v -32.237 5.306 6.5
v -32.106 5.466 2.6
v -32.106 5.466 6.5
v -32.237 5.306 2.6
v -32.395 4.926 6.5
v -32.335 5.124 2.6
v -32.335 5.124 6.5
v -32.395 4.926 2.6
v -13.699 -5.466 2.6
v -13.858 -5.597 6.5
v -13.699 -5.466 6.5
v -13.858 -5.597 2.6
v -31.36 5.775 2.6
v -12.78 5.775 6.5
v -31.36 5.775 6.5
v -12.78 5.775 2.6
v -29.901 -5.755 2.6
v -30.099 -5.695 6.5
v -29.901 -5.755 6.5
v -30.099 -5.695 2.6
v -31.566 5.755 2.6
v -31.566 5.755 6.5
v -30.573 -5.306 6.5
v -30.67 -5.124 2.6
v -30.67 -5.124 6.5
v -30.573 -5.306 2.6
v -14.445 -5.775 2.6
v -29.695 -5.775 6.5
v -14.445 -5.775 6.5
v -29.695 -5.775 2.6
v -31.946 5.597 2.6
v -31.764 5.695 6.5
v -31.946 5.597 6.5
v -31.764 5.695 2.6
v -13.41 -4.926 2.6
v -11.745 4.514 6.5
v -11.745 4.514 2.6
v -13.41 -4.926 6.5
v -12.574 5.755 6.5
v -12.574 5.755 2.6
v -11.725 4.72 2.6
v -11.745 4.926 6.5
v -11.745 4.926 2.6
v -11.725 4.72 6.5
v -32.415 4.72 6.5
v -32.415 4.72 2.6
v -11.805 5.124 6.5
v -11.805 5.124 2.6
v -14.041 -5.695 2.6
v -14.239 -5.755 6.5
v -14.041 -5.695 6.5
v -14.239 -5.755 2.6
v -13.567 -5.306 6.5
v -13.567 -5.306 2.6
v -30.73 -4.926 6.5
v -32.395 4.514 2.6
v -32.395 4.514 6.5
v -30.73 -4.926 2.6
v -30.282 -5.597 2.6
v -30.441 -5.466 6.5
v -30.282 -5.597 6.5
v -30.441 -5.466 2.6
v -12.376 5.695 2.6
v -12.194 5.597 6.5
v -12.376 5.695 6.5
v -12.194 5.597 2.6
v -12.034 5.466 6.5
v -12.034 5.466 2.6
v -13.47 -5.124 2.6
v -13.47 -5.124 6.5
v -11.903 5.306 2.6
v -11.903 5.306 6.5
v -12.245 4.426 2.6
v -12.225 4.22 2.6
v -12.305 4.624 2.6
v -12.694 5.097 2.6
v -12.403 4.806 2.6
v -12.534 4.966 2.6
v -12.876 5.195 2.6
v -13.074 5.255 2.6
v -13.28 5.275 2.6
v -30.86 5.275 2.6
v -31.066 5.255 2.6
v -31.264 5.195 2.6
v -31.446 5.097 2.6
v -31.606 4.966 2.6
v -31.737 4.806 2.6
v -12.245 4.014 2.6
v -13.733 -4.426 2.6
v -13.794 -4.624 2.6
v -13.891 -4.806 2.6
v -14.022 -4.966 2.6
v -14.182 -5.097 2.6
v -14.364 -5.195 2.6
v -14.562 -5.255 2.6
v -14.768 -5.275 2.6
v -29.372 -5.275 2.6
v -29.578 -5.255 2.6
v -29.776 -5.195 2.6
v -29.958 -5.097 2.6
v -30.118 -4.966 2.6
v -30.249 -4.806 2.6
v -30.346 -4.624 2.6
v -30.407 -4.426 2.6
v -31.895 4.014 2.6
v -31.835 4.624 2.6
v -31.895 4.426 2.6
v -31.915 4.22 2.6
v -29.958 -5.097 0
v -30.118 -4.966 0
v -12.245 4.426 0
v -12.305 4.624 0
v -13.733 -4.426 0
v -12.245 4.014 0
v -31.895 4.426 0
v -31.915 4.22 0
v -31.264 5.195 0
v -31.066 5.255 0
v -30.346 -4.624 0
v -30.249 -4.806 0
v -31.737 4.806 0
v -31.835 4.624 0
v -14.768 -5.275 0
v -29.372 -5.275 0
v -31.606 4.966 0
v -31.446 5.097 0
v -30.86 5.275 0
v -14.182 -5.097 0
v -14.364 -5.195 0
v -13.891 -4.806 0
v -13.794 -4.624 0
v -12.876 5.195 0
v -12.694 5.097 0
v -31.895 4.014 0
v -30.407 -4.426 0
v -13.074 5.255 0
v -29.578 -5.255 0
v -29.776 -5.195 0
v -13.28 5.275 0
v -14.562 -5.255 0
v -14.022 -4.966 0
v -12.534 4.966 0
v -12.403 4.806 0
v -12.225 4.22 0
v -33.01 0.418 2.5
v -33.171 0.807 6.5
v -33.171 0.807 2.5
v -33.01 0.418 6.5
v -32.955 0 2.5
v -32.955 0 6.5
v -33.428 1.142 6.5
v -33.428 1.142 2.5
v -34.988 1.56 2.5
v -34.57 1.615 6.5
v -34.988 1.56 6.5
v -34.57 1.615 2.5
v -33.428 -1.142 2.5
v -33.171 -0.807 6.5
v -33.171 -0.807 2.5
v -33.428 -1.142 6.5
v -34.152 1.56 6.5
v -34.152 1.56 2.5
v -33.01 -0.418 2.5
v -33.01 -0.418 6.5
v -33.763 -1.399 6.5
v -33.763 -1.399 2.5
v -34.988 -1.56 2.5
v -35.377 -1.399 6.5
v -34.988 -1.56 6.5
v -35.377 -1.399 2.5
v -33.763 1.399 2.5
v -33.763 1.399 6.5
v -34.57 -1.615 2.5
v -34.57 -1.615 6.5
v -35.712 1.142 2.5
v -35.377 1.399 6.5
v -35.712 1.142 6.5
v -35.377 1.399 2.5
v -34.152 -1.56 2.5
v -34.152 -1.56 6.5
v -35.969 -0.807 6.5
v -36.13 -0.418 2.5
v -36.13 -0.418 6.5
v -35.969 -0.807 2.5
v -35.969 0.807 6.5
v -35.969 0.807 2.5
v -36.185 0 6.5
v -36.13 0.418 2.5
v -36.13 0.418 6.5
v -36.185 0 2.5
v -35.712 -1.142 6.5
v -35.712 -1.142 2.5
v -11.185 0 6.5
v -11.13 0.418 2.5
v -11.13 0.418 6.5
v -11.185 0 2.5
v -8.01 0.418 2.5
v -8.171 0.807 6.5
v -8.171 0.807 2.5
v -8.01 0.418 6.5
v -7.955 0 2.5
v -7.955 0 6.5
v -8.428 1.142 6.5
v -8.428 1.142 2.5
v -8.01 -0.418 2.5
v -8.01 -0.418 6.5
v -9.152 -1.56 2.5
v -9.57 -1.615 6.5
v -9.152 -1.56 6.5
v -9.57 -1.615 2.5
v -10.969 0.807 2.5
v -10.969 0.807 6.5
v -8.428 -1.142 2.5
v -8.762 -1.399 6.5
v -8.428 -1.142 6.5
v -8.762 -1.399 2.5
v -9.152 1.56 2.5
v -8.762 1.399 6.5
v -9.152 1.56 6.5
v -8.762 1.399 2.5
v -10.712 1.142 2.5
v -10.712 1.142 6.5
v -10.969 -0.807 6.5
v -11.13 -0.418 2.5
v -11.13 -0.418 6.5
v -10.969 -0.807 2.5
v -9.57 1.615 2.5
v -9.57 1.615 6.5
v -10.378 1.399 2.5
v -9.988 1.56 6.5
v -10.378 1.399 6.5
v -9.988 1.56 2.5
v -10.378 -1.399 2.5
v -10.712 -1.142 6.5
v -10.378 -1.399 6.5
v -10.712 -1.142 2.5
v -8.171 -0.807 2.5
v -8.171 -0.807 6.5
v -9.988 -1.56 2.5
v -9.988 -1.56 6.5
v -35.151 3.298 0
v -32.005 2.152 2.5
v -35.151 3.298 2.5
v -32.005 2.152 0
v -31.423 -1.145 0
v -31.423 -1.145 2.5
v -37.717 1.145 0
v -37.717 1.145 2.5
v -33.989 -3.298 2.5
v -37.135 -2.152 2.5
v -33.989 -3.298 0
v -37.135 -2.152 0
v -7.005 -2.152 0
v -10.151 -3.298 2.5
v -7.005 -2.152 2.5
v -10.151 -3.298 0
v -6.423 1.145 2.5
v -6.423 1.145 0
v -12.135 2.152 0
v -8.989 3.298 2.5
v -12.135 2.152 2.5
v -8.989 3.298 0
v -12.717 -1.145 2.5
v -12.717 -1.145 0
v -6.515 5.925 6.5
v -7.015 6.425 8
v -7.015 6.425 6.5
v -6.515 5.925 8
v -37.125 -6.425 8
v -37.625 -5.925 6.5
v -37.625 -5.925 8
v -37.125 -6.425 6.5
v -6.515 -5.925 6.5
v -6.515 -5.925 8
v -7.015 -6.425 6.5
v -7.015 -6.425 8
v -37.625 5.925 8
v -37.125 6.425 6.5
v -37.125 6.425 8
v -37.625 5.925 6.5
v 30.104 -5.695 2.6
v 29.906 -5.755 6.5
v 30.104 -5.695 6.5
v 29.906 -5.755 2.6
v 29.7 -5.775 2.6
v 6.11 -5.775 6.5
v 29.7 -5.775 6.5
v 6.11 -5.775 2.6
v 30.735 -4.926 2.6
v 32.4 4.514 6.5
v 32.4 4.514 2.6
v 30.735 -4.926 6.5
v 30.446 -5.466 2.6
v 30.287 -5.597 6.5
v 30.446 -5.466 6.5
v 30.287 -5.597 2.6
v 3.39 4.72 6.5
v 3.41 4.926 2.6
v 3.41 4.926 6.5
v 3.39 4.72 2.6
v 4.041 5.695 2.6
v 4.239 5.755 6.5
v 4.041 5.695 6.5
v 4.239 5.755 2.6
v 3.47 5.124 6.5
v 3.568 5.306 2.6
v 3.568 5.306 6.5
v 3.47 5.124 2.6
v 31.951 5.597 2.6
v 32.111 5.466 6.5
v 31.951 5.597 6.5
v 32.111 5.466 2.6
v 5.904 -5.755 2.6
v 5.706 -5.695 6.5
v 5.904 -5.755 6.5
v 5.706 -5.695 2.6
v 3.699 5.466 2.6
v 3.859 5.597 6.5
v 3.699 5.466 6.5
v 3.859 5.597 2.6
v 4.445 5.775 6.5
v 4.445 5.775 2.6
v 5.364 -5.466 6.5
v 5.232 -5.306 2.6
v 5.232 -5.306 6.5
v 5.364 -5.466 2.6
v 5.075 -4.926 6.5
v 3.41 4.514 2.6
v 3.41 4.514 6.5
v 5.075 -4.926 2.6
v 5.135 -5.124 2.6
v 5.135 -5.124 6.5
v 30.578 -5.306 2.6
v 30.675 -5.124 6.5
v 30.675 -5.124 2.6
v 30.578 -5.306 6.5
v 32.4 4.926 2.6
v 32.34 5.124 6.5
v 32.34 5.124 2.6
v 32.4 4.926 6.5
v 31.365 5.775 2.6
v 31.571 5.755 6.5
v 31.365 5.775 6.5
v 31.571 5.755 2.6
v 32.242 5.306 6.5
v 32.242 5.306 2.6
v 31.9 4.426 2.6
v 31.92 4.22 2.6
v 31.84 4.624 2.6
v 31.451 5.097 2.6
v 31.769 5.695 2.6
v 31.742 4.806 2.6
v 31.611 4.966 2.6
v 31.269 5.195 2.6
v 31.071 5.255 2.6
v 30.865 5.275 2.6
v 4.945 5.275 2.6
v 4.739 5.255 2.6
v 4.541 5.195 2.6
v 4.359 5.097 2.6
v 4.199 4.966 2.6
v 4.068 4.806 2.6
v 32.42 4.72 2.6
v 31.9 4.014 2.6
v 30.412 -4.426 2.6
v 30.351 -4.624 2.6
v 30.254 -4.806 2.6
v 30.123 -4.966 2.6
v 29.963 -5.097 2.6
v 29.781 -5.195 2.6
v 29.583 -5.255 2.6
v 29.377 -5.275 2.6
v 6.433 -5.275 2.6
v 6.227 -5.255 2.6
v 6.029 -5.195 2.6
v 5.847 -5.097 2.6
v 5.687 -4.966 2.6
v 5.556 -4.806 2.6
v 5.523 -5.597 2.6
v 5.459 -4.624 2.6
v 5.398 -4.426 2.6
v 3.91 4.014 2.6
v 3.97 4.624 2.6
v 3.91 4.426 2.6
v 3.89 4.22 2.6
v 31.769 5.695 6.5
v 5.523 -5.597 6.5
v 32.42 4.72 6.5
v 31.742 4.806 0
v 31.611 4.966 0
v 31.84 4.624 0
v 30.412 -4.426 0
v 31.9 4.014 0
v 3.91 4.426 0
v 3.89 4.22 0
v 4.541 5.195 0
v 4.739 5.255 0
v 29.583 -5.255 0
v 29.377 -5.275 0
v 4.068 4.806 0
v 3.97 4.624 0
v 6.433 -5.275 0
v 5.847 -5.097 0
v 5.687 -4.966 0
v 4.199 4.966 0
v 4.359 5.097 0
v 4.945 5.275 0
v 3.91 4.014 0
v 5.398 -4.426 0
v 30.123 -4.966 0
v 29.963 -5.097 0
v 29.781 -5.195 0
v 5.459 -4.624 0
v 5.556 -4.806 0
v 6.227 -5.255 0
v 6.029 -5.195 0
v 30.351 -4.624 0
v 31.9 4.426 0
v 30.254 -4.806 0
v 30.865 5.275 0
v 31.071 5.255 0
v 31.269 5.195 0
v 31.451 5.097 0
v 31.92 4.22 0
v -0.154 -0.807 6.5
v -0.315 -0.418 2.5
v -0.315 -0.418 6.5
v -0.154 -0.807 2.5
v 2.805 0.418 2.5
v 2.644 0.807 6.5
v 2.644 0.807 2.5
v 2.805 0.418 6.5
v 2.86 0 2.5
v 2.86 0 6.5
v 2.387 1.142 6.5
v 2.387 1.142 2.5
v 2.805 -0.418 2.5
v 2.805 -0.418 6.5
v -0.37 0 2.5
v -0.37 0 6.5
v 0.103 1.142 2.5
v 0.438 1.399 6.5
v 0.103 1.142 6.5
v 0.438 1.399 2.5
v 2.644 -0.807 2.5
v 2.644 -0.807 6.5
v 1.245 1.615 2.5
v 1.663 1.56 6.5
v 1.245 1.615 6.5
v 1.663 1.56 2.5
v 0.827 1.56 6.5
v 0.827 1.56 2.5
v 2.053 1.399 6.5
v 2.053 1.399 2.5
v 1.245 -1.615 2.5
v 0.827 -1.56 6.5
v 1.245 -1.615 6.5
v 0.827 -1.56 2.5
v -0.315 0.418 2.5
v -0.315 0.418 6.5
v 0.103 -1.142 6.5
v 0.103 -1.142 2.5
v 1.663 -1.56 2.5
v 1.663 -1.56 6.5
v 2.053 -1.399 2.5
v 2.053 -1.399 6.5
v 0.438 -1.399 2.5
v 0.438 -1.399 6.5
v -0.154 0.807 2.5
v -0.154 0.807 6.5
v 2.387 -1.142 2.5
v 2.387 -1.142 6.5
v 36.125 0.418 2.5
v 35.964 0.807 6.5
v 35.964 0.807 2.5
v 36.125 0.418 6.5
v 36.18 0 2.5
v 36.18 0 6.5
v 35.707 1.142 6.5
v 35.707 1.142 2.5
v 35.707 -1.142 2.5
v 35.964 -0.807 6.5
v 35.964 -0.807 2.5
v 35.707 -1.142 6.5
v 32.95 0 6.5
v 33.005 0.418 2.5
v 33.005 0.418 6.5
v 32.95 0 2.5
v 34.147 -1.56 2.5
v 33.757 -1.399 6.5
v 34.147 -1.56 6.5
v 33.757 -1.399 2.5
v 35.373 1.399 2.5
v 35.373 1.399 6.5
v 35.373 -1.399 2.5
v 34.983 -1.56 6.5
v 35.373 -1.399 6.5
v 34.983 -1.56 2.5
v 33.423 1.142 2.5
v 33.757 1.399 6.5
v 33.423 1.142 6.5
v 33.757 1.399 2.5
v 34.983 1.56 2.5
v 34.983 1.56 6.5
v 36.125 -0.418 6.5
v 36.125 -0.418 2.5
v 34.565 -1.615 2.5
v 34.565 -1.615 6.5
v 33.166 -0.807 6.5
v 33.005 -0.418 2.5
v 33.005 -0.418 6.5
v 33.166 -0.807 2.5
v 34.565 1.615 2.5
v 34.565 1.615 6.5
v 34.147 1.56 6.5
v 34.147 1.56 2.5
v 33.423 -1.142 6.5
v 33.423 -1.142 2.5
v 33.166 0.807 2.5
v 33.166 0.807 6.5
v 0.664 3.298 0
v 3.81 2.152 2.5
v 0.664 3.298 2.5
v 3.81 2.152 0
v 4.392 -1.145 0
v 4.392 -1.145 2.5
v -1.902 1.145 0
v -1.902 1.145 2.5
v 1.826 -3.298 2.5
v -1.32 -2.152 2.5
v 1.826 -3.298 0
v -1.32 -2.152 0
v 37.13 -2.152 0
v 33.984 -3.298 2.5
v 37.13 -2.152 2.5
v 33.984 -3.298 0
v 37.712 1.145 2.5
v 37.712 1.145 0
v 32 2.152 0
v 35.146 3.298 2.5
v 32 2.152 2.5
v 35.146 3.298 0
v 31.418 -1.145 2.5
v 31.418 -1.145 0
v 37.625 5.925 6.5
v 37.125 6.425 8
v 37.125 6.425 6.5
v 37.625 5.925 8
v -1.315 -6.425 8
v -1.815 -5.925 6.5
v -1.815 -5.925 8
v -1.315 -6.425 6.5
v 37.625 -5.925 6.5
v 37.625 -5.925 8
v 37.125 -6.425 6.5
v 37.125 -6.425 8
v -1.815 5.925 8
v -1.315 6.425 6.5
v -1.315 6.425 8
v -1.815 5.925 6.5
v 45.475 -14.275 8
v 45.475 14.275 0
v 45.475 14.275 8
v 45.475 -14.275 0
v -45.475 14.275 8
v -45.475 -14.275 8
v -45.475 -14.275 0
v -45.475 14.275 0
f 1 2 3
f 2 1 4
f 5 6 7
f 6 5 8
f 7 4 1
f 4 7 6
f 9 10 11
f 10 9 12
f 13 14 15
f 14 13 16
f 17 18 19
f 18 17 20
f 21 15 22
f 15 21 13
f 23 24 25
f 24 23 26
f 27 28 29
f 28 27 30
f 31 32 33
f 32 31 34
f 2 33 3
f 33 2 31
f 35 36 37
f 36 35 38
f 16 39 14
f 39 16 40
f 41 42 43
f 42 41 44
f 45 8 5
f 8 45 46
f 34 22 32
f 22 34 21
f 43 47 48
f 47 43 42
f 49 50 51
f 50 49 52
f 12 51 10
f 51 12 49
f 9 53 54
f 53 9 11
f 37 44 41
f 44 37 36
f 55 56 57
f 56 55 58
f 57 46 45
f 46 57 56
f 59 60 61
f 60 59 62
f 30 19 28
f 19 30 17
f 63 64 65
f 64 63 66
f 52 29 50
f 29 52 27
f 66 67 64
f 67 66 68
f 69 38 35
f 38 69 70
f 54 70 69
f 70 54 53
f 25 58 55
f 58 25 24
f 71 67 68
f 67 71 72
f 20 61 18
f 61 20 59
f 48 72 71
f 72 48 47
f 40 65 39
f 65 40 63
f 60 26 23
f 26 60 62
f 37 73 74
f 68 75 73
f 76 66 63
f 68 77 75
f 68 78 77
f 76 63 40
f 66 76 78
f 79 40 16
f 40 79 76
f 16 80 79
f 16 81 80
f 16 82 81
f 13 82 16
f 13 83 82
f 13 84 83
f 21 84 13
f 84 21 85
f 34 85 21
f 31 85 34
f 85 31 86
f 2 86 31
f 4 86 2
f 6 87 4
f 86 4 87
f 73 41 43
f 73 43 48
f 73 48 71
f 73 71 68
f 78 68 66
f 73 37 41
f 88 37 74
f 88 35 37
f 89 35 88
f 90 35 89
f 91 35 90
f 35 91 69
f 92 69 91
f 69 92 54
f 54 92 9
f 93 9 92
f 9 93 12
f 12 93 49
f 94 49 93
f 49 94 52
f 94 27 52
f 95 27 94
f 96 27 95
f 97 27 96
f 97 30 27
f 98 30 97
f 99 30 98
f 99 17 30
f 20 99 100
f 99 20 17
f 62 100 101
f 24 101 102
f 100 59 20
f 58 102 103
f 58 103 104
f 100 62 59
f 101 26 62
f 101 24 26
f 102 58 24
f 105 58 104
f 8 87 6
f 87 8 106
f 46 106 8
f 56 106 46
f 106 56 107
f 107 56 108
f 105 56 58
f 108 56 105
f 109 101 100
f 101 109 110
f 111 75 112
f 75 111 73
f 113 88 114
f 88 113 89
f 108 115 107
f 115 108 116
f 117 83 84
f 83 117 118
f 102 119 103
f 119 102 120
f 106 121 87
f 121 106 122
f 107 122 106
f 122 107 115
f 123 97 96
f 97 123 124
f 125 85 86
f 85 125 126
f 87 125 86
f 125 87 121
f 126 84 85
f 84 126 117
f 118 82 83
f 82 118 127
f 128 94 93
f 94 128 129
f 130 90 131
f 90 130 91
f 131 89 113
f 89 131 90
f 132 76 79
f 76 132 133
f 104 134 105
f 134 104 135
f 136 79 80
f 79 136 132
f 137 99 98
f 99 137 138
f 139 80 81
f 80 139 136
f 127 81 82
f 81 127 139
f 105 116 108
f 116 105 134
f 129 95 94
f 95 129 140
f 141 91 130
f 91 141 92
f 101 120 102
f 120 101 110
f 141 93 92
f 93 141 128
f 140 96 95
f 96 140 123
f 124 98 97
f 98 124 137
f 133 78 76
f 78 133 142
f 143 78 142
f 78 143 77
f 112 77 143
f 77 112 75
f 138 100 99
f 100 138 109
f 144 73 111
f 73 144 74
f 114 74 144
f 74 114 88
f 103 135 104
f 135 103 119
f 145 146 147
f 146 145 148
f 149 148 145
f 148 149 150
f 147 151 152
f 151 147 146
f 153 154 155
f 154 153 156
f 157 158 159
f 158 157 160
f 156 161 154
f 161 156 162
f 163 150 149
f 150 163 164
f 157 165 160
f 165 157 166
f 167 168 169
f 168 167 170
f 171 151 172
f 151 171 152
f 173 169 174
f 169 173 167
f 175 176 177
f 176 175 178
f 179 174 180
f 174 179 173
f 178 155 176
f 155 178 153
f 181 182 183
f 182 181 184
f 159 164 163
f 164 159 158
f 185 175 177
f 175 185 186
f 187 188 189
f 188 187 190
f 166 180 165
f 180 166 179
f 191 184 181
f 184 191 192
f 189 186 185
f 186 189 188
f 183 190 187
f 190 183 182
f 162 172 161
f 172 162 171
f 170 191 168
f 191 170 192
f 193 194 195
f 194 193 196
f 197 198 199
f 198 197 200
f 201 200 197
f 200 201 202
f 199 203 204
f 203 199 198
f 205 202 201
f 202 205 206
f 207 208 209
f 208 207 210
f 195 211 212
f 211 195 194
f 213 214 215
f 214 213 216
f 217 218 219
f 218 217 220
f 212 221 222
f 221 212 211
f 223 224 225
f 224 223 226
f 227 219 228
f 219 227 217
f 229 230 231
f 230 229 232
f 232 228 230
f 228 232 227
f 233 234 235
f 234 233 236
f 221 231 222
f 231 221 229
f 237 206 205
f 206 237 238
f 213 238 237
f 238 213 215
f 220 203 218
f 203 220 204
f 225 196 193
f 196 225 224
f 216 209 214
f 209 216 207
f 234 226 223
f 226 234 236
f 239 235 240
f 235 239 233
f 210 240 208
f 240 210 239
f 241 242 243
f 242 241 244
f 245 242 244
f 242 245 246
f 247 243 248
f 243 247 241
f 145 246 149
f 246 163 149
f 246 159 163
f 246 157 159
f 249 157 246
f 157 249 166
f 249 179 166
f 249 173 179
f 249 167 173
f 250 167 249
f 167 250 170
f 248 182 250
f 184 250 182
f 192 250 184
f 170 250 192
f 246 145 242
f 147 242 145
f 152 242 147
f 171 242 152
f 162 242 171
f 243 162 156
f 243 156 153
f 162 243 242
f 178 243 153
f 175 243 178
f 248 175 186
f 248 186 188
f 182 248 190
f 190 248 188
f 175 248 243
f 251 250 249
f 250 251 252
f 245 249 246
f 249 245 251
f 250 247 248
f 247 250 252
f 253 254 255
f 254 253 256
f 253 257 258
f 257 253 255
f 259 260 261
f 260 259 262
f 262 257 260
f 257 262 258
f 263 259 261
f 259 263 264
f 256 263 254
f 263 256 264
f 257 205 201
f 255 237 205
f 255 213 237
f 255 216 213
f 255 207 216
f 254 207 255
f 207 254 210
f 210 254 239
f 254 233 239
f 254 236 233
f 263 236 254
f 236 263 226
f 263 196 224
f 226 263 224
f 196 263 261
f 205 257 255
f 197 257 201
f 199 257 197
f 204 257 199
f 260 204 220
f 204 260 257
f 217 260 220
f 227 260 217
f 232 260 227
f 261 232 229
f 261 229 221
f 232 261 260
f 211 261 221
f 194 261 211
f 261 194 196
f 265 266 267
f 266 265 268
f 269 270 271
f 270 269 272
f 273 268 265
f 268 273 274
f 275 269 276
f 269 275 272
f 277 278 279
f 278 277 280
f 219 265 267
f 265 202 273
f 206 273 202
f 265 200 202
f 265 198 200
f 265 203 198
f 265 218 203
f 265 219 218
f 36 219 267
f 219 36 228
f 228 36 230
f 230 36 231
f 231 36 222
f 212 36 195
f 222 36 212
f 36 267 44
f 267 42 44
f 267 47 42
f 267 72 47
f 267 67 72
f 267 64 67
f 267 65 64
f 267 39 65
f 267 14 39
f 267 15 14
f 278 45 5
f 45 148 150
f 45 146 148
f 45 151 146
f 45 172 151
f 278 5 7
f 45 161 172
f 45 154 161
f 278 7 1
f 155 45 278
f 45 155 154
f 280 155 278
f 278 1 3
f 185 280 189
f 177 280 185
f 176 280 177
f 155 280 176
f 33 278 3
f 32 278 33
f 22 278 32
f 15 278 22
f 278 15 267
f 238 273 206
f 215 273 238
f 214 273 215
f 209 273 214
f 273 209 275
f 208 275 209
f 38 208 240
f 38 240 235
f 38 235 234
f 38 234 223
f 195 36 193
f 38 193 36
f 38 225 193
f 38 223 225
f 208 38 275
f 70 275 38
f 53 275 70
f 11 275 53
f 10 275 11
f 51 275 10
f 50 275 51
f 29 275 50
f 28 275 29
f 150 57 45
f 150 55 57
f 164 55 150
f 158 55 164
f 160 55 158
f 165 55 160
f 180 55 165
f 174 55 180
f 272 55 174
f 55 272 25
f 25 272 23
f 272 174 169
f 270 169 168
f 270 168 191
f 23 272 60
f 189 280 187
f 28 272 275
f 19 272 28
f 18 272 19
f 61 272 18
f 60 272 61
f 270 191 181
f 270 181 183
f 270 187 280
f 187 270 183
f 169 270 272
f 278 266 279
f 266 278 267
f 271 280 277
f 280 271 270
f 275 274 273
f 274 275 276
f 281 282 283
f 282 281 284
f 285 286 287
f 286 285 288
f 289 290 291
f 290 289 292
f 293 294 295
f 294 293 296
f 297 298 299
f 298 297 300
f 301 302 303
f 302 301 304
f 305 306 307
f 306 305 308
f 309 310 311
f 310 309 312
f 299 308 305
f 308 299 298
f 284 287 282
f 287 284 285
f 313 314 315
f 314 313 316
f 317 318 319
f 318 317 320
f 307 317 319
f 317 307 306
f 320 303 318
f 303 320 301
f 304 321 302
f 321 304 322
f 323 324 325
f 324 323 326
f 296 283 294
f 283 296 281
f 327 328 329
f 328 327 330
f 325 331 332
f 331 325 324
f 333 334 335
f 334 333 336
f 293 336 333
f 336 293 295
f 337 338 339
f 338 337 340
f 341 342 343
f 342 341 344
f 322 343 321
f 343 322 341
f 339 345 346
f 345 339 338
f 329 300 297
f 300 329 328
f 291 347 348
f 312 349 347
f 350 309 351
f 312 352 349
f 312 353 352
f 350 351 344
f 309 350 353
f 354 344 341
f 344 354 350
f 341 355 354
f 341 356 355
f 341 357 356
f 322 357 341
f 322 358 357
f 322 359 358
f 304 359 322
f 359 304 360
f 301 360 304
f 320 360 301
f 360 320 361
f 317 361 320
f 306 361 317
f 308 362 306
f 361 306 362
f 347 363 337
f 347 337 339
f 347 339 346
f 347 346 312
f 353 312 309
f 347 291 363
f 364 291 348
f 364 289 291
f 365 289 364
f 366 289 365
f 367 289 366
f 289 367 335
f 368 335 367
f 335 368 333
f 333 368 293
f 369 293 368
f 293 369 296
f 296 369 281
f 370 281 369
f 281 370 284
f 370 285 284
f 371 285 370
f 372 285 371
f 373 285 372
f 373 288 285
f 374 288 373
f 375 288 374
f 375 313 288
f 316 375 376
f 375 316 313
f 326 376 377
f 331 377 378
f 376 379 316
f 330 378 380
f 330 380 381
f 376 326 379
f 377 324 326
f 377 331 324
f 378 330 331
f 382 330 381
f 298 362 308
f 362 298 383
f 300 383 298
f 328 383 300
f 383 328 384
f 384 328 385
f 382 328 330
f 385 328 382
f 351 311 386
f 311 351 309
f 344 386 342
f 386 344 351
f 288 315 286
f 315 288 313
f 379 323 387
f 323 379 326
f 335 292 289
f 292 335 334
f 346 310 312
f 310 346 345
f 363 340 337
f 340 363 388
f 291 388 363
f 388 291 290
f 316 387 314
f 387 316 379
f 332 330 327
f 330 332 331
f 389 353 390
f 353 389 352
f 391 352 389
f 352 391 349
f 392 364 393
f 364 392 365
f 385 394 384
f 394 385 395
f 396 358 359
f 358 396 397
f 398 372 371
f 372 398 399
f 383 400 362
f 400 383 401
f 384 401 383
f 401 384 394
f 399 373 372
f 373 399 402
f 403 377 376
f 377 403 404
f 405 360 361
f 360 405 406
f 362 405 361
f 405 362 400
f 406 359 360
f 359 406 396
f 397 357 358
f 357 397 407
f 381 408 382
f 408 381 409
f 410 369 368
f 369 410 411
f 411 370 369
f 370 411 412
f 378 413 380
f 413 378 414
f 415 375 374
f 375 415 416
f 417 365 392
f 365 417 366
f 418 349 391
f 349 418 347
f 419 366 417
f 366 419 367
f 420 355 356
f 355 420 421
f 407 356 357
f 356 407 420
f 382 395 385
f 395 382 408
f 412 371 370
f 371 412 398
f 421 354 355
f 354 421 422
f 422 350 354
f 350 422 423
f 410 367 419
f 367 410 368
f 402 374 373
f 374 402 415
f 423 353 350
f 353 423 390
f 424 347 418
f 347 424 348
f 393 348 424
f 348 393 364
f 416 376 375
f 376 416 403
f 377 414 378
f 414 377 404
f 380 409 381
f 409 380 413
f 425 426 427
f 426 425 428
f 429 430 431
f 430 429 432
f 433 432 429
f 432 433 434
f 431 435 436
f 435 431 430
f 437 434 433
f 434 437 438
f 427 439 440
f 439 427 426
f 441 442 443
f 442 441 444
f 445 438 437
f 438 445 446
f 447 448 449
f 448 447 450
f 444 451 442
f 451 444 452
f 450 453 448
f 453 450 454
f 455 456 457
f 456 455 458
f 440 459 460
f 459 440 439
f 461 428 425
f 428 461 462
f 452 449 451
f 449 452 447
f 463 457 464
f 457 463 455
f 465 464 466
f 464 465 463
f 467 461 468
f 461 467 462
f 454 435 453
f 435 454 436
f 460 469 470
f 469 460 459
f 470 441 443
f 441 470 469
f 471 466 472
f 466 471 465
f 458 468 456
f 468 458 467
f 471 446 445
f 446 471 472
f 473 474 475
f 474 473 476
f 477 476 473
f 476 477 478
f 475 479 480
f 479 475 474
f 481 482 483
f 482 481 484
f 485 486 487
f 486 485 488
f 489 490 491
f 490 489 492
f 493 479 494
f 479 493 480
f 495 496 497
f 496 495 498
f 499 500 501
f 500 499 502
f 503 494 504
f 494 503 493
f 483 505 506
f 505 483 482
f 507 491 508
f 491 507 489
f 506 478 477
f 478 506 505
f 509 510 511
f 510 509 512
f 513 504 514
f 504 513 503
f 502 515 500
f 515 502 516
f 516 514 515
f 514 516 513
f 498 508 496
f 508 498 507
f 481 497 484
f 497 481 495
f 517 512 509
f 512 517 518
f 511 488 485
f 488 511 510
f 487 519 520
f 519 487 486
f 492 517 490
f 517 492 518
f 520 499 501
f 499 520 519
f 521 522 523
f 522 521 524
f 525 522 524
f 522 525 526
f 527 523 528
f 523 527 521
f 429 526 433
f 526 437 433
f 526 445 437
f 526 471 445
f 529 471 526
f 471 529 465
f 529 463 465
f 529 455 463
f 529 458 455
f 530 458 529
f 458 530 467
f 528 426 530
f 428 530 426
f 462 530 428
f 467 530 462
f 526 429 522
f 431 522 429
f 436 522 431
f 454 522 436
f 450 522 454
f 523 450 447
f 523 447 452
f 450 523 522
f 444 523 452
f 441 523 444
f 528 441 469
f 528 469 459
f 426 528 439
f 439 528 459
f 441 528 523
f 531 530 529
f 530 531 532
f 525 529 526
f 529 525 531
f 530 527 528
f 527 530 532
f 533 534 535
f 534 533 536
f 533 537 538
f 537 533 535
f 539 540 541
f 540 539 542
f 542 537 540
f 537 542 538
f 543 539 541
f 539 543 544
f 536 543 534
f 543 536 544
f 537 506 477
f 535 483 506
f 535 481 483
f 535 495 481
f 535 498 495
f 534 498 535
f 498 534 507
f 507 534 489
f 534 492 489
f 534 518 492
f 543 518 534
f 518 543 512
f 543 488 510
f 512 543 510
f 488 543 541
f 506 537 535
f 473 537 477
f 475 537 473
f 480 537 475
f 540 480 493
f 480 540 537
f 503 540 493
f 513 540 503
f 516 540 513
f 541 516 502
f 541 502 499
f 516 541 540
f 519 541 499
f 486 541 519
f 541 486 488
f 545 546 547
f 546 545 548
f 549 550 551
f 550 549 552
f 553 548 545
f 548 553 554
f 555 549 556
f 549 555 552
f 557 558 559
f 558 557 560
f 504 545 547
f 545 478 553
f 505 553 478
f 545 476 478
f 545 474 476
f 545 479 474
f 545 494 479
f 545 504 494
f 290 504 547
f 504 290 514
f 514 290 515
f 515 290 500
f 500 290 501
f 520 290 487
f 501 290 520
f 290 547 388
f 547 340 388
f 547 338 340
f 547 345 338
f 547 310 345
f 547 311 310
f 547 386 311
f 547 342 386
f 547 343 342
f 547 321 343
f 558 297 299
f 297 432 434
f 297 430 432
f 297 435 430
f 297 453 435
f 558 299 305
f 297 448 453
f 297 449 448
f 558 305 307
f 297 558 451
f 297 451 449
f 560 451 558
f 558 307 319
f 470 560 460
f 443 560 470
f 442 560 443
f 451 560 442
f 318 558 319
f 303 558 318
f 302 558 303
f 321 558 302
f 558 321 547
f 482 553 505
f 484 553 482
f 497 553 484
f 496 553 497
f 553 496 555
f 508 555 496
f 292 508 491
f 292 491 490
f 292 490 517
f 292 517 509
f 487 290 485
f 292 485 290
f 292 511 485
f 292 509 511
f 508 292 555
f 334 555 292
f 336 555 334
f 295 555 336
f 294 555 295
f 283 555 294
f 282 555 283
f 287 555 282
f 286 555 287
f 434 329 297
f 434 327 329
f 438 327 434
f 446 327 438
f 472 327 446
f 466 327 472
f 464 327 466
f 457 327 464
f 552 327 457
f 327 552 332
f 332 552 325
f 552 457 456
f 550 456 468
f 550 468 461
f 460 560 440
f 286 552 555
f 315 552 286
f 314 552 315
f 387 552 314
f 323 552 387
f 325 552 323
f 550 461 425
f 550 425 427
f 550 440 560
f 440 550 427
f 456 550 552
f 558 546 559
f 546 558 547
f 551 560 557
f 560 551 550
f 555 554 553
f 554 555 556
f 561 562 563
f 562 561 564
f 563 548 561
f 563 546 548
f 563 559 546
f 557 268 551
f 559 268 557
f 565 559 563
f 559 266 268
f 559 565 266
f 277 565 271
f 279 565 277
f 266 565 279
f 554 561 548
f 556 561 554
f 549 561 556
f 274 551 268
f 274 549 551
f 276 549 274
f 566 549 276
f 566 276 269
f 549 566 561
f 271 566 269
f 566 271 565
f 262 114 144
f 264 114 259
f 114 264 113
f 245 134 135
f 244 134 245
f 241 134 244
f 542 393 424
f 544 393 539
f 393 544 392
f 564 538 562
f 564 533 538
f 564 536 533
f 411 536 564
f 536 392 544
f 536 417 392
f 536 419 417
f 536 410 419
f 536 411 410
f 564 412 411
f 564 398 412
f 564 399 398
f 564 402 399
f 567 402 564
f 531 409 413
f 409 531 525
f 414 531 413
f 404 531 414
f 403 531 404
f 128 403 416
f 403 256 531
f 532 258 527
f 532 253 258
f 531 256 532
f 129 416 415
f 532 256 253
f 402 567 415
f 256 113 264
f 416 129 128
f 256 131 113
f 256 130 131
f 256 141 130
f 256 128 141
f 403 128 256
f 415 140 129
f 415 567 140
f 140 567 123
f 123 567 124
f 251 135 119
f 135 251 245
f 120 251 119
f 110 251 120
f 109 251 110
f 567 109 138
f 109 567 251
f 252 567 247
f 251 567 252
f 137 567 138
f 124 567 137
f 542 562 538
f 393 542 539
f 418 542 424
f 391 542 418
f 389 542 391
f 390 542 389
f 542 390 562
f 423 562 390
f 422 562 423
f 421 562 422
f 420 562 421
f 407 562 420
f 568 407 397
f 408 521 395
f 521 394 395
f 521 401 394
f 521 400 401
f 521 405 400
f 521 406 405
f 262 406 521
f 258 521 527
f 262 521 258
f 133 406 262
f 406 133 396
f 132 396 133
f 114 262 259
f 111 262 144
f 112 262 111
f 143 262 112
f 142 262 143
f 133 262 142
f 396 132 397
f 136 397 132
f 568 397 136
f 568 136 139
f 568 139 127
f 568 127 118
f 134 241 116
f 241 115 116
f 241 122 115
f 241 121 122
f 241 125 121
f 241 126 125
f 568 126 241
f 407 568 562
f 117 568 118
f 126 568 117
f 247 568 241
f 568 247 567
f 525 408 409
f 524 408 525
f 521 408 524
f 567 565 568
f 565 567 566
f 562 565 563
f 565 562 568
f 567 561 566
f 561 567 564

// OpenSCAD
// D-SUB Panel Mount Bracket (Top Panel for Enclosure)
// D-Subコネクタ用パネルマウント天板
//
// D-Sub形状: dpeart氏のライブラリを参考 (http://forums.reprap.org/read.php?313,577003)
// ブラケット寸法: NopSCADlib を参考 (https://github.com/nophead/NopSCADlib)

// ===== パラメータ =====

// 3Dプリント公差
tolerance = 0.3;  // 開口部の余裕

// 板設定
plate_thickness = 8;          // 板の厚さ (M3x8ネジ対応)
plate_margin = 8;             // コネクタ周囲の余白

// フランジ（標準ブラケット）ザグリ設定
flange_recess_depth = 1.5;    // ザグリ深さ (ブラケット厚さ、標準1.12mm + 余裕)
flange_corner_r = 0.5;        // ブラケット角のR (ほぼ角張り)

// M3ナット設定
m3_nut_width = 5.5;           // 二面幅 (対辺)
m3_nut_depth = 2.5;           // ナットの厚さ (2.4mm) + 少し余裕

// ===== D-Sub コネクタ寸法テーブル =====
// D型開口部 (dpeart氏のライブラリより)
// [b, d, f, k] = [取付穴中心距離/2, 開口幅/2, 開口高さ/2, 角R]
function db_opening_table(idx) =
    idx == "db9"  ? [12.50, 11.10, 6.53, 2.11] :
    idx == "db15" ? [16.66, 15.27, 6.53, 2.11] :
    idx == "db25" ? [23.52, 22.15, 6.53, 2.11] :
    idx == "db37" ? [31.75, 29.54, 6.53, 2.11] :
    "Error";

// ブラケット外形 (NopSCADlibより)
// [幅, 高さ, flange_thickness]
function db_bracket_table(idx) =
    idx == "db9"  ? [30.81,  12.55, 1.12] :  // DE-9
    idx == "db15" ? [39.14,  12.55, 1.12] :  // DA-15
    idx == "db25" ? [53.04,  12.55, 1.12] :  // DB-25
    idx == "db37" ? [69.50,  12.55, 1.12] :  // DC-37
    "Error";

// ===== 使用するコネクタタイプ =====
// connector_type = "db9";  // db9, db15, db25, db37 (単体生成時に使用)

// ===== モジュール =====

// D型形状 (2D) - 開口部用
module dsub_shape_2d(conn, gap = 0) {
    sides = 32;
    cut_angle = 10;  // D型の傾斜角度

    conn_dimensions = db_opening_table(conn);

    if (conn_dimensions != "Error") {
        d = conn_dimensions[1];  // 開口幅/2
        f = conn_dimensions[2];  // 開口高さ/2
        k = conn_dimensions[3];  // 角R (直径として使用)

        g = gap;  // 公差
        o = 2 * (g + f - k) * tan(cut_angle);  // D型のオフセット量

        hull() {
            // 上側 (広い側)
            translate([-(g + d - k), (g + f - k)])
                circle(d = k, $fn = sides);  // 修正: d=k (直径=k)
            translate([(g + d - k), (g + f - k)])
                circle(d = k, $fn = sides);
            // 下側 (狭い側) - D型の特徴
            translate([-(g + d - k) + o, -(g + f - k)])
                circle(d = k, $fn = sides);
            translate([(g + d - k) - o, -(g + f - k)])
                circle(d = k, $fn = sides);
        }
    }
}

// D-Sub開口部 (貫通穴、テーパー付き)
// 表面側は公差付き、奥側は絞って固定強化
module dsub_opening(conn, gap = 0, depth = 1, taper = true) {
    mounting_hole = 3.05;
    conn_dimensions = db_opening_table(conn);

    // テーパー設定: 表面側の深さ (ナット凹み直上まで)
    taper_depth = plate_thickness - m3_nut_depth;  // 約7mm
    inner_gap = -0.2;  // 奥側は少し小さく

    if (conn_dimensions == "Error") {
        echo(str("ERROR: Connector '", conn, "' not found"));
        color("red") cube([10, 10, depth], center = true);
    } else {
        b = conn_dimensions[0];  // 取付穴中心距離/2
        g = gap;

        if (taper && depth > taper_depth) {
            // 表面側: 公差付きD型開口
            translate([0, 0, depth - taper_depth])
                linear_extrude(height = taper_depth + 0.1)
                    dsub_shape_2d(conn, gap);

            // 奥側: 絞ったD型開口
            linear_extrude(height = depth - taper_depth + 0.1)
                dsub_shape_2d(conn, inner_gap);
        } else {
            // テーパーなし（従来通り）
            linear_extrude(height = depth)
                dsub_shape_2d(conn, gap);
        }

        // 取付穴 (貫通)
        translate([-b, 0, 0])
            cylinder(h = depth, d = g * 0.6 + mounting_hole, $fn = 24);
        translate([b, 0, 0])
            cylinder(h = depth, d = g * 0.6 + mounting_hole, $fn = 24);
    }
}

// フランジ用ザグリ (ブラケットが収まる長方形の凹み)
module dsub_flange_recess(width, height, corner_r, depth) {
    // 角丸長方形 (ほぼ長方形)
    linear_extrude(height = depth) {
        offset(r = corner_r) {
            offset(r = -corner_r) {
                square([width, height], center = true);
            }
        }
    }
}

// 六角ナット用凹み
module hex_nut_recess(width, depth, rotation = 0) {
    // 六角形 (二面幅 = width)
    rotate([0, 0, rotation])
        cylinder(h = depth, d = width / cos(30), $fn = 6);
}

// M3ナット凹み (裏面用)
// D型斜辺と平行に六角ナットを配置
// cylinder($fn=6)の辺方向: 60°, 120°, 180°, 240°, 300°, 0°
// D型斜辺: 右=80°, 左=100° (cut_angle=10°のとき)
module dsub_nut_recesses(conn, depth) {
    conn_dimensions = db_opening_table(conn);
    cut_angle = 10;  // D型の傾斜角度
    // 斜辺角度: 90° ± cut_angle
    // 六角形の60°辺→80°: +20°回転、120°辺→100°: -20°回転
    nut_rotation = 90 - cut_angle - 60;  // = 20°
    if (conn_dimensions != "Error") {
        b = conn_dimensions[0];  // 取付穴中心距離/2
        // 左側: 斜辺は100°方向 → 120°の辺を-20°回転
        translate([-b, 0, 0])
            hex_nut_recess(m3_nut_width + tolerance, depth, -nut_rotation);
        // 右側: 斜辺は80°方向 → 60°の辺を+20°回転
        translate([b, 0, 0])
            hex_nut_recess(m3_nut_width + tolerance, depth, nut_rotation);
    }
}

// ===== メイン =====

module dsub_panel_mount(conn_type = "db9") {
    opening = db_opening_table(conn_type);
    bracket = db_bracket_table(conn_type);

    if (opening == "Error" || bracket == "Error") {
        echo(str("ERROR: Invalid connector type: ", conn_type));
    } else {
        b = opening[0];  // 取付穴中心距離/2
        d = opening[1];  // 開口幅/2
        f = opening[2];  // 開口高さ/2

        bracket_w = bracket[0];  // ブラケット幅
        bracket_h = bracket[1];  // ブラケット高さ

        // プレートサイズの計算 (取付穴が収まるサイズ)
        center_width = b * 2 + plate_margin * 2;
        center_height = (f + tolerance) * 2 + plate_margin * 2;

        difference() {
            // プレート
            translate([-center_width/2, -center_height/2, 0])
                cube([center_width, center_height, plate_thickness]);

            // フランジ用ザグリ (上面から掘り下げ、長方形)
            translate([0, 0, plate_thickness - flange_recess_depth])
                dsub_flange_recess(bracket_w + tolerance, bracket_h + tolerance, flange_corner_r, flange_recess_depth + 0.1);

            // D-Sub開口部 (貫通穴)
            translate([0, 0, -0.1])
                dsub_opening(conn_type, tolerance, plate_thickness + 0.2);
        }
    }
}

// ===== 複数コネクタ用パネル (行ベース) =====

// 各行は [コネクタタイプ, 個数] の形式
// 例: [["db9", 3], ["db15", 1]] = DE-9が3個横並び、その下にDA-15が1個
module multi_dsub_panel_rows(rows, h_spacing = 5, v_spacing = 5) {
    // 各行の幅と高さを計算
    row_widths = [for (row = rows)
        let(conn = row[0], count = row[1], bracket_w = db_bracket_table(conn)[0])
        count * bracket_w + (count - 1) * h_spacing + plate_margin * 2];

    row_heights = [for (row = rows)
        let(conn = row[0], bracket_h = db_bracket_table(conn)[1])
        bracket_h + plate_margin];

    // 全体サイズ
    total_width = max(row_widths);
    total_height = [for (i = [0:len(rows)-1]) row_heights[i]][0] * len(rows)
                   + (len(rows) - 1) * v_spacing + plate_margin;

    // 各行のY位置を計算
    function cumulative_height(idx) =
        idx == 0 ? row_heights[0]/2 + plate_margin/2 :
        cumulative_height(idx-1) + row_heights[idx-1]/2 + v_spacing + row_heights[idx]/2;

    difference() {
        // 1枚の板
        translate([-total_width/2, -total_height/2, 0])
            cube([total_width, total_height, plate_thickness]);

        // 各行のコネクタ
        for (r = [0:len(rows)-1]) {
            conn = rows[r][0];
            count = rows[r][1];
            bracket = db_bracket_table(conn);
            bracket_w = bracket[0];
            bracket_h = bracket[1];

            row_width = count * bracket_w + (count - 1) * h_spacing;
            y_pos = total_height/2 - cumulative_height(r);

            for (c = [0:count-1]) {
                x_pos = -row_width/2 + bracket_w/2 + c * (bracket_w + h_spacing);

                translate([x_pos, y_pos, 0]) {
                    // フランジ用ザグリ
                    translate([0, 0, plate_thickness - flange_recess_depth])
                        dsub_flange_recess(bracket_w + tolerance, bracket_h + tolerance, flange_corner_r, flange_recess_depth + 0.1);

                    // D-Sub開口部
                    translate([0, 0, -0.1])
                        dsub_opening(conn, tolerance, plate_thickness + 0.2);
                }
            }
        }
    }
}

// ===== カスタムレイアウト用パネル =====

// 各コネクタを [タイプ, x位置, y位置] で指定
module custom_dsub_panel(connectors, panel_width, panel_height) {
    difference() {
        // 板
        translate([-panel_width/2, -panel_height/2, 0])
            cube([panel_width, panel_height, plate_thickness]);

        // 各コネクタの開口部とザグリ
        for (c = connectors) {
            conn_type = c[0];
            x_pos = c[1];
            y_pos = c[2];
            bracket = db_bracket_table(conn_type);
            bracket_w = bracket[0];
            bracket_h = bracket[1];

            translate([x_pos, y_pos, 0]) {
                // フランジ用ザグリ (上面)
                translate([0, 0, plate_thickness - flange_recess_depth])
                    dsub_flange_recess(bracket_w + tolerance, bracket_h + tolerance, flange_corner_r, flange_recess_depth + 0.1);

                // D-Sub開口部 (貫通)
                translate([0, 0, -0.1])
                    dsub_opening(conn_type, tolerance, plate_thickness + 0.2);

                // M3ナット凹み (裏面)
                translate([0, 0, -0.1])
                    dsub_nut_recesses(conn_type, m3_nut_depth + 0.1);
            }
        }
    }
}

// ===== レンダリング =====

// テスト用: DE-9 と DA-15 を横に並べた小さい板
db9_w = db_bracket_table("db9")[0];
db15_w = db_bracket_table("db15")[0];
bracket_h = db_bracket_table("db9")[1];
h_spacing = 5;

test_width = db9_w + db15_w + h_spacing + plate_margin * 2;
test_height = bracket_h + plate_margin * 2;

custom_dsub_panel([
    ["db9", -(db15_w + h_spacing) / 2, 0],
    ["db15", (db9_w + h_spacing) / 2, 0]
], test_width, test_height);
